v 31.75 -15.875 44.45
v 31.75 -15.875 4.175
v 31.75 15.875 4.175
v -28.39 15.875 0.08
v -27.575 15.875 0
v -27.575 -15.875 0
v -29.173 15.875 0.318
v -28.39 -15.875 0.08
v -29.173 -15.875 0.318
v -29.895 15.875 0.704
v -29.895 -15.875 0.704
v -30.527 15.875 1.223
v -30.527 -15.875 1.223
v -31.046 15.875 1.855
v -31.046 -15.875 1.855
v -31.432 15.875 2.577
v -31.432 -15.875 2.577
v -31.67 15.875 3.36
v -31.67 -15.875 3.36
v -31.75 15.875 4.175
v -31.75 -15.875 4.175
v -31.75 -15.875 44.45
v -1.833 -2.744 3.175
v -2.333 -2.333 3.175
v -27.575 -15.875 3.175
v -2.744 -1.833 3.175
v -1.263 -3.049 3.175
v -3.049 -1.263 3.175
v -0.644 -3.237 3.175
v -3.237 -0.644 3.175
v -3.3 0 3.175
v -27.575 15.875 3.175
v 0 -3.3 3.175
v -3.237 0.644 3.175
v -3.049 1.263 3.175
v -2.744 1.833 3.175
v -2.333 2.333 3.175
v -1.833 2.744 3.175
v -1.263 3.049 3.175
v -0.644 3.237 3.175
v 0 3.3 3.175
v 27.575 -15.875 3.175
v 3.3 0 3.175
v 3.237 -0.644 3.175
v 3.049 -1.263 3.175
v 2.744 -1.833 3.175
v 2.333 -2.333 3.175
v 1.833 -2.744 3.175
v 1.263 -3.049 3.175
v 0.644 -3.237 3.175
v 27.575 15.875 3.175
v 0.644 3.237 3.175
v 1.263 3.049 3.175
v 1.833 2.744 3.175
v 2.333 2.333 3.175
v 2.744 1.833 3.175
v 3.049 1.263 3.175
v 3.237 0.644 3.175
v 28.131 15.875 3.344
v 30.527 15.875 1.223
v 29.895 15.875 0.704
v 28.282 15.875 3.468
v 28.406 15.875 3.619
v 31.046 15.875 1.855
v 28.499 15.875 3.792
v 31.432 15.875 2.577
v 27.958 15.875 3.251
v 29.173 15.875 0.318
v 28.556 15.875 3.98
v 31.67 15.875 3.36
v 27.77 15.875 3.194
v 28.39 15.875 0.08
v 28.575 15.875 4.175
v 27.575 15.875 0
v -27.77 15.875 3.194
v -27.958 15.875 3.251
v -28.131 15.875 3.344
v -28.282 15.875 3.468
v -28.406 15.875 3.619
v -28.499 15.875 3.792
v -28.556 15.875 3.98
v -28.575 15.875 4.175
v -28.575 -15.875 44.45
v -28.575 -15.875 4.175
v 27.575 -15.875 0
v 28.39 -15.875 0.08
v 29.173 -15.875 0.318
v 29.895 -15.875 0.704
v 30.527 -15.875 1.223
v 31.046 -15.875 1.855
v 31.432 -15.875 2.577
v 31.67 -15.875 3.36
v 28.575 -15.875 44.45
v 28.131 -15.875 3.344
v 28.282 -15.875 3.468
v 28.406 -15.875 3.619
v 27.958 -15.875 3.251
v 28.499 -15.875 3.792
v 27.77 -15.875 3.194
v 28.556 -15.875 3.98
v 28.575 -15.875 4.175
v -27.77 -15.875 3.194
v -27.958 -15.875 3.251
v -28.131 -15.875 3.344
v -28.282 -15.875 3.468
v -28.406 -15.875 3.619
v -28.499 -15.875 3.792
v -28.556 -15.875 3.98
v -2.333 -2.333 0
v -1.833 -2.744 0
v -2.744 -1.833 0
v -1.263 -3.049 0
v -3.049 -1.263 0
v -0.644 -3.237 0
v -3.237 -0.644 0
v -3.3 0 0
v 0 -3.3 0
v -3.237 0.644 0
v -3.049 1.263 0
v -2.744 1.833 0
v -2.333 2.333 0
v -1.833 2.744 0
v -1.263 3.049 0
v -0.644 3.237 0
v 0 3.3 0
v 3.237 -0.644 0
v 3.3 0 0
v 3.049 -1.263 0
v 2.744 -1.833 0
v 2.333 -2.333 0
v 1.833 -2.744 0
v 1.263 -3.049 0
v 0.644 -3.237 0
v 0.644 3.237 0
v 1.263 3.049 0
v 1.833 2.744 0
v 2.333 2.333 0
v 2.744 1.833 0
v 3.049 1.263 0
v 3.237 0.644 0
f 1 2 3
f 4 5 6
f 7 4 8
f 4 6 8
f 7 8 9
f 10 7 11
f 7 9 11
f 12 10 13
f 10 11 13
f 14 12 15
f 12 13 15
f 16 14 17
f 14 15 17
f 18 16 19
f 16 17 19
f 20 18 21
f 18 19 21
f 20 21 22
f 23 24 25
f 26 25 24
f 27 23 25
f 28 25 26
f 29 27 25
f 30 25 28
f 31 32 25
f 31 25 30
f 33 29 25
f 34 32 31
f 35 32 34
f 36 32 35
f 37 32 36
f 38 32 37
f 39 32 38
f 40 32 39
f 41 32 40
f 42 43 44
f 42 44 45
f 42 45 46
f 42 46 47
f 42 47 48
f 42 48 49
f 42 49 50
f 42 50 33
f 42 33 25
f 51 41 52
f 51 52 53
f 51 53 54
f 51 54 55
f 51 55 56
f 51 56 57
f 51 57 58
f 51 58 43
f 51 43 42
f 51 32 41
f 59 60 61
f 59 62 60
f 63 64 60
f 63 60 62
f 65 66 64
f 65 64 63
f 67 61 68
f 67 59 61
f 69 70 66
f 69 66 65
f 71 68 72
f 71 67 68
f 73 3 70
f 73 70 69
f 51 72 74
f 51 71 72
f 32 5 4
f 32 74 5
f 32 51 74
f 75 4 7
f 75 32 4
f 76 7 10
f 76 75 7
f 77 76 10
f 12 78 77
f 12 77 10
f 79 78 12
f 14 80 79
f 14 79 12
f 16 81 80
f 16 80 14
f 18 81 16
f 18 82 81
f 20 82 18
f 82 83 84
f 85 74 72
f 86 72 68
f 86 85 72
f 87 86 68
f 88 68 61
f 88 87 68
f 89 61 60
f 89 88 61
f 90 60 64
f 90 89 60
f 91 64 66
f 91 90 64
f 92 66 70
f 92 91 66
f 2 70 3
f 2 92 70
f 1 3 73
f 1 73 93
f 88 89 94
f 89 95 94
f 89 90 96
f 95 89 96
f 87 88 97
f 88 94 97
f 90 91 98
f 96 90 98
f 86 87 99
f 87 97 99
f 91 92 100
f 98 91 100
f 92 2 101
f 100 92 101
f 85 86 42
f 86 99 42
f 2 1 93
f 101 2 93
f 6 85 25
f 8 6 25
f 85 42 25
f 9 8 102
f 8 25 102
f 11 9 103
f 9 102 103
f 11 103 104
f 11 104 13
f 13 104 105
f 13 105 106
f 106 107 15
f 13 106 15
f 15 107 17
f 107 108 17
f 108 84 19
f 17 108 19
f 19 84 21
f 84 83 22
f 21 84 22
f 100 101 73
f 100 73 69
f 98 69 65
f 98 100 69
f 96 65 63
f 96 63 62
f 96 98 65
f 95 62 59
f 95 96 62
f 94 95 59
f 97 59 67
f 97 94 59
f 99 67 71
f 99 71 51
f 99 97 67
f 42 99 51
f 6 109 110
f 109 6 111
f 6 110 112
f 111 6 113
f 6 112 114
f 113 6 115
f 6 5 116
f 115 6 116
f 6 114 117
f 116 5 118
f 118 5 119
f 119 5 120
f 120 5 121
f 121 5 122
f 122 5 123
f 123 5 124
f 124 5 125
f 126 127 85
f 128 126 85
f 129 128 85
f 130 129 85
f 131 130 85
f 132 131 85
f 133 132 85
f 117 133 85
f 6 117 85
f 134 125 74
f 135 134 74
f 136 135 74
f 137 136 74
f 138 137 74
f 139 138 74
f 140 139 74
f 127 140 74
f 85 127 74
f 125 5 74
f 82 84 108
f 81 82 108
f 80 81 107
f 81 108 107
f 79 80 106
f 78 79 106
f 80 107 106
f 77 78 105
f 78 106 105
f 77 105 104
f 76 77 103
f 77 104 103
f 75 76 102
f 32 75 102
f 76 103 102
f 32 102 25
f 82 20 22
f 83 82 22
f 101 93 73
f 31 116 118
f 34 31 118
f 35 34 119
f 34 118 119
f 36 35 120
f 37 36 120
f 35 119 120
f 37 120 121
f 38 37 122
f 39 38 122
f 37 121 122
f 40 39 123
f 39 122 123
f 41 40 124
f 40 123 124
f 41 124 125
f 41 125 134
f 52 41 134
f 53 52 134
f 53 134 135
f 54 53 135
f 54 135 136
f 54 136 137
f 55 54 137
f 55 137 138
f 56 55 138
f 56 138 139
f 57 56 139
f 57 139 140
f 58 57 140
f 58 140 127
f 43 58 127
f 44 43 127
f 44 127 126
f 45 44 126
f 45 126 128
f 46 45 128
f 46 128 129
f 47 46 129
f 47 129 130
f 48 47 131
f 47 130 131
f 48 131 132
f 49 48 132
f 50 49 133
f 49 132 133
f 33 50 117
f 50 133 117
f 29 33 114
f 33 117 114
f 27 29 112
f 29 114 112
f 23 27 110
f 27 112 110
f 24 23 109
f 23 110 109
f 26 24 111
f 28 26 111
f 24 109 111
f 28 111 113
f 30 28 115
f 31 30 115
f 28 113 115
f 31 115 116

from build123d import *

# Parameters (mm, degrees)
SKETCH2_W                    = 57.15
SKETCH2_H                    = 31.75
BASE_FLANGE1_DEPTH           = 3.175
EDGE_FLANGE1_STRIP_W         = 14.7
EDGE_FLANGE1_STRIP_H         = 3.175
EDGE_FLANGE1_STRIP_CUT_DEPTH = 31.75
EDGE_FLANGE1_DEPTH           = 31.75
CUT_EXTRUDE1_DEPTH           = 3.175
M6_CLEARANCE_HOLE1_D         = 6.6


# Sheet-metal steps are written as plain solids
with BuildPart() as part:
    # Sketch2 → Base-Flange1 (new body)
    with BuildSketch(Plane.XY):
        Rectangle(SKETCH2_W, SKETCH2_H)
    extrude(amount=BASE_FLANGE1_DEPTH)

    # Edge-Flange1 strip (across the edge) → Edge-Flange1 strip cut (cut)
    with BuildSketch(Plane(origin=(28.575, -15.875, 3.175), x_dir=(-1, 0, 0), z_dir=(0, 1, 0))):
        with Locations((-6.35, -1.5875)):
            Rectangle(EDGE_FLANGE1_STRIP_W, EDGE_FLANGE1_STRIP_H)
    edge_flange1_strip_cut = extrude(amount=EDGE_FLANGE1_STRIP_CUT_DEPTH, mode=Mode.SUBTRACT)

    # Edge-Flange1 section (across the edge) → Edge-Flange1 (add)
    with BuildSketch(Plane(origin=(28.575, -15.875, 3.175), x_dir=(-1, 0, 0), z_dir=(0, 1, 0))):
        with BuildLine():
            Line((-3.175, 1), (-3.175, 41.275))
            Line((-3.175, 41.275), (0, 41.275))
            Line((0, 41.275), (0, 1))
            ThreePointArc((0, 1), (0.292893219, 0.292893219), (1, 0))
            Line((1, 0), (1, -3.175))
            ThreePointArc((1, -3.175), (-1.952170811, -1.952170811), (-3.175, 1))
        make_face()
    edge_flange1 = extrude(amount=EDGE_FLANGE1_DEPTH)

    # Sketch10 → Cut-Extrude1 (cut)
    with BuildSketch(Plane(origin=(31.75, 0, 0), x_dir=(0, 0, -1), z_dir=(1, 0, 0))):
        Polygon((-4.175, 15.875), (-44.45, -15.875), (-44.45, 15.875), align=None)
    cut_extrude1 = extrude(amount=-CUT_EXTRUDE1_DEPTH, mode=Mode.SUBTRACT)

    # Mirror1: Edge-Flange1 strip cut, Edge-Flange1, Cut-Extrude1 across plane
    add(edge_flange1_strip_cut.mirror(Plane(origin=(0, 0, 0), x_dir=(0, 0, 1), z_dir=(1, 0, 0))), mode=Mode.SUBTRACT)
    add(edge_flange1.mirror(Plane(origin=(0, 0, 0), x_dir=(0, 0, 1), z_dir=(1, 0, 0))))
    add(cut_extrude1.mirror(Plane(origin=(0, 0, 0), x_dir=(0, 0, 1), z_dir=(1, 0, 0))), mode=Mode.SUBTRACT)

    # M6 Clearance Hole1 (through all)
    with Locations(Plane.XY.offset(3.175)):
        with Locations((0, 0)):
            Hole(M6_CLEARANCE_HOLE1_D / 2)


solid = part.part
